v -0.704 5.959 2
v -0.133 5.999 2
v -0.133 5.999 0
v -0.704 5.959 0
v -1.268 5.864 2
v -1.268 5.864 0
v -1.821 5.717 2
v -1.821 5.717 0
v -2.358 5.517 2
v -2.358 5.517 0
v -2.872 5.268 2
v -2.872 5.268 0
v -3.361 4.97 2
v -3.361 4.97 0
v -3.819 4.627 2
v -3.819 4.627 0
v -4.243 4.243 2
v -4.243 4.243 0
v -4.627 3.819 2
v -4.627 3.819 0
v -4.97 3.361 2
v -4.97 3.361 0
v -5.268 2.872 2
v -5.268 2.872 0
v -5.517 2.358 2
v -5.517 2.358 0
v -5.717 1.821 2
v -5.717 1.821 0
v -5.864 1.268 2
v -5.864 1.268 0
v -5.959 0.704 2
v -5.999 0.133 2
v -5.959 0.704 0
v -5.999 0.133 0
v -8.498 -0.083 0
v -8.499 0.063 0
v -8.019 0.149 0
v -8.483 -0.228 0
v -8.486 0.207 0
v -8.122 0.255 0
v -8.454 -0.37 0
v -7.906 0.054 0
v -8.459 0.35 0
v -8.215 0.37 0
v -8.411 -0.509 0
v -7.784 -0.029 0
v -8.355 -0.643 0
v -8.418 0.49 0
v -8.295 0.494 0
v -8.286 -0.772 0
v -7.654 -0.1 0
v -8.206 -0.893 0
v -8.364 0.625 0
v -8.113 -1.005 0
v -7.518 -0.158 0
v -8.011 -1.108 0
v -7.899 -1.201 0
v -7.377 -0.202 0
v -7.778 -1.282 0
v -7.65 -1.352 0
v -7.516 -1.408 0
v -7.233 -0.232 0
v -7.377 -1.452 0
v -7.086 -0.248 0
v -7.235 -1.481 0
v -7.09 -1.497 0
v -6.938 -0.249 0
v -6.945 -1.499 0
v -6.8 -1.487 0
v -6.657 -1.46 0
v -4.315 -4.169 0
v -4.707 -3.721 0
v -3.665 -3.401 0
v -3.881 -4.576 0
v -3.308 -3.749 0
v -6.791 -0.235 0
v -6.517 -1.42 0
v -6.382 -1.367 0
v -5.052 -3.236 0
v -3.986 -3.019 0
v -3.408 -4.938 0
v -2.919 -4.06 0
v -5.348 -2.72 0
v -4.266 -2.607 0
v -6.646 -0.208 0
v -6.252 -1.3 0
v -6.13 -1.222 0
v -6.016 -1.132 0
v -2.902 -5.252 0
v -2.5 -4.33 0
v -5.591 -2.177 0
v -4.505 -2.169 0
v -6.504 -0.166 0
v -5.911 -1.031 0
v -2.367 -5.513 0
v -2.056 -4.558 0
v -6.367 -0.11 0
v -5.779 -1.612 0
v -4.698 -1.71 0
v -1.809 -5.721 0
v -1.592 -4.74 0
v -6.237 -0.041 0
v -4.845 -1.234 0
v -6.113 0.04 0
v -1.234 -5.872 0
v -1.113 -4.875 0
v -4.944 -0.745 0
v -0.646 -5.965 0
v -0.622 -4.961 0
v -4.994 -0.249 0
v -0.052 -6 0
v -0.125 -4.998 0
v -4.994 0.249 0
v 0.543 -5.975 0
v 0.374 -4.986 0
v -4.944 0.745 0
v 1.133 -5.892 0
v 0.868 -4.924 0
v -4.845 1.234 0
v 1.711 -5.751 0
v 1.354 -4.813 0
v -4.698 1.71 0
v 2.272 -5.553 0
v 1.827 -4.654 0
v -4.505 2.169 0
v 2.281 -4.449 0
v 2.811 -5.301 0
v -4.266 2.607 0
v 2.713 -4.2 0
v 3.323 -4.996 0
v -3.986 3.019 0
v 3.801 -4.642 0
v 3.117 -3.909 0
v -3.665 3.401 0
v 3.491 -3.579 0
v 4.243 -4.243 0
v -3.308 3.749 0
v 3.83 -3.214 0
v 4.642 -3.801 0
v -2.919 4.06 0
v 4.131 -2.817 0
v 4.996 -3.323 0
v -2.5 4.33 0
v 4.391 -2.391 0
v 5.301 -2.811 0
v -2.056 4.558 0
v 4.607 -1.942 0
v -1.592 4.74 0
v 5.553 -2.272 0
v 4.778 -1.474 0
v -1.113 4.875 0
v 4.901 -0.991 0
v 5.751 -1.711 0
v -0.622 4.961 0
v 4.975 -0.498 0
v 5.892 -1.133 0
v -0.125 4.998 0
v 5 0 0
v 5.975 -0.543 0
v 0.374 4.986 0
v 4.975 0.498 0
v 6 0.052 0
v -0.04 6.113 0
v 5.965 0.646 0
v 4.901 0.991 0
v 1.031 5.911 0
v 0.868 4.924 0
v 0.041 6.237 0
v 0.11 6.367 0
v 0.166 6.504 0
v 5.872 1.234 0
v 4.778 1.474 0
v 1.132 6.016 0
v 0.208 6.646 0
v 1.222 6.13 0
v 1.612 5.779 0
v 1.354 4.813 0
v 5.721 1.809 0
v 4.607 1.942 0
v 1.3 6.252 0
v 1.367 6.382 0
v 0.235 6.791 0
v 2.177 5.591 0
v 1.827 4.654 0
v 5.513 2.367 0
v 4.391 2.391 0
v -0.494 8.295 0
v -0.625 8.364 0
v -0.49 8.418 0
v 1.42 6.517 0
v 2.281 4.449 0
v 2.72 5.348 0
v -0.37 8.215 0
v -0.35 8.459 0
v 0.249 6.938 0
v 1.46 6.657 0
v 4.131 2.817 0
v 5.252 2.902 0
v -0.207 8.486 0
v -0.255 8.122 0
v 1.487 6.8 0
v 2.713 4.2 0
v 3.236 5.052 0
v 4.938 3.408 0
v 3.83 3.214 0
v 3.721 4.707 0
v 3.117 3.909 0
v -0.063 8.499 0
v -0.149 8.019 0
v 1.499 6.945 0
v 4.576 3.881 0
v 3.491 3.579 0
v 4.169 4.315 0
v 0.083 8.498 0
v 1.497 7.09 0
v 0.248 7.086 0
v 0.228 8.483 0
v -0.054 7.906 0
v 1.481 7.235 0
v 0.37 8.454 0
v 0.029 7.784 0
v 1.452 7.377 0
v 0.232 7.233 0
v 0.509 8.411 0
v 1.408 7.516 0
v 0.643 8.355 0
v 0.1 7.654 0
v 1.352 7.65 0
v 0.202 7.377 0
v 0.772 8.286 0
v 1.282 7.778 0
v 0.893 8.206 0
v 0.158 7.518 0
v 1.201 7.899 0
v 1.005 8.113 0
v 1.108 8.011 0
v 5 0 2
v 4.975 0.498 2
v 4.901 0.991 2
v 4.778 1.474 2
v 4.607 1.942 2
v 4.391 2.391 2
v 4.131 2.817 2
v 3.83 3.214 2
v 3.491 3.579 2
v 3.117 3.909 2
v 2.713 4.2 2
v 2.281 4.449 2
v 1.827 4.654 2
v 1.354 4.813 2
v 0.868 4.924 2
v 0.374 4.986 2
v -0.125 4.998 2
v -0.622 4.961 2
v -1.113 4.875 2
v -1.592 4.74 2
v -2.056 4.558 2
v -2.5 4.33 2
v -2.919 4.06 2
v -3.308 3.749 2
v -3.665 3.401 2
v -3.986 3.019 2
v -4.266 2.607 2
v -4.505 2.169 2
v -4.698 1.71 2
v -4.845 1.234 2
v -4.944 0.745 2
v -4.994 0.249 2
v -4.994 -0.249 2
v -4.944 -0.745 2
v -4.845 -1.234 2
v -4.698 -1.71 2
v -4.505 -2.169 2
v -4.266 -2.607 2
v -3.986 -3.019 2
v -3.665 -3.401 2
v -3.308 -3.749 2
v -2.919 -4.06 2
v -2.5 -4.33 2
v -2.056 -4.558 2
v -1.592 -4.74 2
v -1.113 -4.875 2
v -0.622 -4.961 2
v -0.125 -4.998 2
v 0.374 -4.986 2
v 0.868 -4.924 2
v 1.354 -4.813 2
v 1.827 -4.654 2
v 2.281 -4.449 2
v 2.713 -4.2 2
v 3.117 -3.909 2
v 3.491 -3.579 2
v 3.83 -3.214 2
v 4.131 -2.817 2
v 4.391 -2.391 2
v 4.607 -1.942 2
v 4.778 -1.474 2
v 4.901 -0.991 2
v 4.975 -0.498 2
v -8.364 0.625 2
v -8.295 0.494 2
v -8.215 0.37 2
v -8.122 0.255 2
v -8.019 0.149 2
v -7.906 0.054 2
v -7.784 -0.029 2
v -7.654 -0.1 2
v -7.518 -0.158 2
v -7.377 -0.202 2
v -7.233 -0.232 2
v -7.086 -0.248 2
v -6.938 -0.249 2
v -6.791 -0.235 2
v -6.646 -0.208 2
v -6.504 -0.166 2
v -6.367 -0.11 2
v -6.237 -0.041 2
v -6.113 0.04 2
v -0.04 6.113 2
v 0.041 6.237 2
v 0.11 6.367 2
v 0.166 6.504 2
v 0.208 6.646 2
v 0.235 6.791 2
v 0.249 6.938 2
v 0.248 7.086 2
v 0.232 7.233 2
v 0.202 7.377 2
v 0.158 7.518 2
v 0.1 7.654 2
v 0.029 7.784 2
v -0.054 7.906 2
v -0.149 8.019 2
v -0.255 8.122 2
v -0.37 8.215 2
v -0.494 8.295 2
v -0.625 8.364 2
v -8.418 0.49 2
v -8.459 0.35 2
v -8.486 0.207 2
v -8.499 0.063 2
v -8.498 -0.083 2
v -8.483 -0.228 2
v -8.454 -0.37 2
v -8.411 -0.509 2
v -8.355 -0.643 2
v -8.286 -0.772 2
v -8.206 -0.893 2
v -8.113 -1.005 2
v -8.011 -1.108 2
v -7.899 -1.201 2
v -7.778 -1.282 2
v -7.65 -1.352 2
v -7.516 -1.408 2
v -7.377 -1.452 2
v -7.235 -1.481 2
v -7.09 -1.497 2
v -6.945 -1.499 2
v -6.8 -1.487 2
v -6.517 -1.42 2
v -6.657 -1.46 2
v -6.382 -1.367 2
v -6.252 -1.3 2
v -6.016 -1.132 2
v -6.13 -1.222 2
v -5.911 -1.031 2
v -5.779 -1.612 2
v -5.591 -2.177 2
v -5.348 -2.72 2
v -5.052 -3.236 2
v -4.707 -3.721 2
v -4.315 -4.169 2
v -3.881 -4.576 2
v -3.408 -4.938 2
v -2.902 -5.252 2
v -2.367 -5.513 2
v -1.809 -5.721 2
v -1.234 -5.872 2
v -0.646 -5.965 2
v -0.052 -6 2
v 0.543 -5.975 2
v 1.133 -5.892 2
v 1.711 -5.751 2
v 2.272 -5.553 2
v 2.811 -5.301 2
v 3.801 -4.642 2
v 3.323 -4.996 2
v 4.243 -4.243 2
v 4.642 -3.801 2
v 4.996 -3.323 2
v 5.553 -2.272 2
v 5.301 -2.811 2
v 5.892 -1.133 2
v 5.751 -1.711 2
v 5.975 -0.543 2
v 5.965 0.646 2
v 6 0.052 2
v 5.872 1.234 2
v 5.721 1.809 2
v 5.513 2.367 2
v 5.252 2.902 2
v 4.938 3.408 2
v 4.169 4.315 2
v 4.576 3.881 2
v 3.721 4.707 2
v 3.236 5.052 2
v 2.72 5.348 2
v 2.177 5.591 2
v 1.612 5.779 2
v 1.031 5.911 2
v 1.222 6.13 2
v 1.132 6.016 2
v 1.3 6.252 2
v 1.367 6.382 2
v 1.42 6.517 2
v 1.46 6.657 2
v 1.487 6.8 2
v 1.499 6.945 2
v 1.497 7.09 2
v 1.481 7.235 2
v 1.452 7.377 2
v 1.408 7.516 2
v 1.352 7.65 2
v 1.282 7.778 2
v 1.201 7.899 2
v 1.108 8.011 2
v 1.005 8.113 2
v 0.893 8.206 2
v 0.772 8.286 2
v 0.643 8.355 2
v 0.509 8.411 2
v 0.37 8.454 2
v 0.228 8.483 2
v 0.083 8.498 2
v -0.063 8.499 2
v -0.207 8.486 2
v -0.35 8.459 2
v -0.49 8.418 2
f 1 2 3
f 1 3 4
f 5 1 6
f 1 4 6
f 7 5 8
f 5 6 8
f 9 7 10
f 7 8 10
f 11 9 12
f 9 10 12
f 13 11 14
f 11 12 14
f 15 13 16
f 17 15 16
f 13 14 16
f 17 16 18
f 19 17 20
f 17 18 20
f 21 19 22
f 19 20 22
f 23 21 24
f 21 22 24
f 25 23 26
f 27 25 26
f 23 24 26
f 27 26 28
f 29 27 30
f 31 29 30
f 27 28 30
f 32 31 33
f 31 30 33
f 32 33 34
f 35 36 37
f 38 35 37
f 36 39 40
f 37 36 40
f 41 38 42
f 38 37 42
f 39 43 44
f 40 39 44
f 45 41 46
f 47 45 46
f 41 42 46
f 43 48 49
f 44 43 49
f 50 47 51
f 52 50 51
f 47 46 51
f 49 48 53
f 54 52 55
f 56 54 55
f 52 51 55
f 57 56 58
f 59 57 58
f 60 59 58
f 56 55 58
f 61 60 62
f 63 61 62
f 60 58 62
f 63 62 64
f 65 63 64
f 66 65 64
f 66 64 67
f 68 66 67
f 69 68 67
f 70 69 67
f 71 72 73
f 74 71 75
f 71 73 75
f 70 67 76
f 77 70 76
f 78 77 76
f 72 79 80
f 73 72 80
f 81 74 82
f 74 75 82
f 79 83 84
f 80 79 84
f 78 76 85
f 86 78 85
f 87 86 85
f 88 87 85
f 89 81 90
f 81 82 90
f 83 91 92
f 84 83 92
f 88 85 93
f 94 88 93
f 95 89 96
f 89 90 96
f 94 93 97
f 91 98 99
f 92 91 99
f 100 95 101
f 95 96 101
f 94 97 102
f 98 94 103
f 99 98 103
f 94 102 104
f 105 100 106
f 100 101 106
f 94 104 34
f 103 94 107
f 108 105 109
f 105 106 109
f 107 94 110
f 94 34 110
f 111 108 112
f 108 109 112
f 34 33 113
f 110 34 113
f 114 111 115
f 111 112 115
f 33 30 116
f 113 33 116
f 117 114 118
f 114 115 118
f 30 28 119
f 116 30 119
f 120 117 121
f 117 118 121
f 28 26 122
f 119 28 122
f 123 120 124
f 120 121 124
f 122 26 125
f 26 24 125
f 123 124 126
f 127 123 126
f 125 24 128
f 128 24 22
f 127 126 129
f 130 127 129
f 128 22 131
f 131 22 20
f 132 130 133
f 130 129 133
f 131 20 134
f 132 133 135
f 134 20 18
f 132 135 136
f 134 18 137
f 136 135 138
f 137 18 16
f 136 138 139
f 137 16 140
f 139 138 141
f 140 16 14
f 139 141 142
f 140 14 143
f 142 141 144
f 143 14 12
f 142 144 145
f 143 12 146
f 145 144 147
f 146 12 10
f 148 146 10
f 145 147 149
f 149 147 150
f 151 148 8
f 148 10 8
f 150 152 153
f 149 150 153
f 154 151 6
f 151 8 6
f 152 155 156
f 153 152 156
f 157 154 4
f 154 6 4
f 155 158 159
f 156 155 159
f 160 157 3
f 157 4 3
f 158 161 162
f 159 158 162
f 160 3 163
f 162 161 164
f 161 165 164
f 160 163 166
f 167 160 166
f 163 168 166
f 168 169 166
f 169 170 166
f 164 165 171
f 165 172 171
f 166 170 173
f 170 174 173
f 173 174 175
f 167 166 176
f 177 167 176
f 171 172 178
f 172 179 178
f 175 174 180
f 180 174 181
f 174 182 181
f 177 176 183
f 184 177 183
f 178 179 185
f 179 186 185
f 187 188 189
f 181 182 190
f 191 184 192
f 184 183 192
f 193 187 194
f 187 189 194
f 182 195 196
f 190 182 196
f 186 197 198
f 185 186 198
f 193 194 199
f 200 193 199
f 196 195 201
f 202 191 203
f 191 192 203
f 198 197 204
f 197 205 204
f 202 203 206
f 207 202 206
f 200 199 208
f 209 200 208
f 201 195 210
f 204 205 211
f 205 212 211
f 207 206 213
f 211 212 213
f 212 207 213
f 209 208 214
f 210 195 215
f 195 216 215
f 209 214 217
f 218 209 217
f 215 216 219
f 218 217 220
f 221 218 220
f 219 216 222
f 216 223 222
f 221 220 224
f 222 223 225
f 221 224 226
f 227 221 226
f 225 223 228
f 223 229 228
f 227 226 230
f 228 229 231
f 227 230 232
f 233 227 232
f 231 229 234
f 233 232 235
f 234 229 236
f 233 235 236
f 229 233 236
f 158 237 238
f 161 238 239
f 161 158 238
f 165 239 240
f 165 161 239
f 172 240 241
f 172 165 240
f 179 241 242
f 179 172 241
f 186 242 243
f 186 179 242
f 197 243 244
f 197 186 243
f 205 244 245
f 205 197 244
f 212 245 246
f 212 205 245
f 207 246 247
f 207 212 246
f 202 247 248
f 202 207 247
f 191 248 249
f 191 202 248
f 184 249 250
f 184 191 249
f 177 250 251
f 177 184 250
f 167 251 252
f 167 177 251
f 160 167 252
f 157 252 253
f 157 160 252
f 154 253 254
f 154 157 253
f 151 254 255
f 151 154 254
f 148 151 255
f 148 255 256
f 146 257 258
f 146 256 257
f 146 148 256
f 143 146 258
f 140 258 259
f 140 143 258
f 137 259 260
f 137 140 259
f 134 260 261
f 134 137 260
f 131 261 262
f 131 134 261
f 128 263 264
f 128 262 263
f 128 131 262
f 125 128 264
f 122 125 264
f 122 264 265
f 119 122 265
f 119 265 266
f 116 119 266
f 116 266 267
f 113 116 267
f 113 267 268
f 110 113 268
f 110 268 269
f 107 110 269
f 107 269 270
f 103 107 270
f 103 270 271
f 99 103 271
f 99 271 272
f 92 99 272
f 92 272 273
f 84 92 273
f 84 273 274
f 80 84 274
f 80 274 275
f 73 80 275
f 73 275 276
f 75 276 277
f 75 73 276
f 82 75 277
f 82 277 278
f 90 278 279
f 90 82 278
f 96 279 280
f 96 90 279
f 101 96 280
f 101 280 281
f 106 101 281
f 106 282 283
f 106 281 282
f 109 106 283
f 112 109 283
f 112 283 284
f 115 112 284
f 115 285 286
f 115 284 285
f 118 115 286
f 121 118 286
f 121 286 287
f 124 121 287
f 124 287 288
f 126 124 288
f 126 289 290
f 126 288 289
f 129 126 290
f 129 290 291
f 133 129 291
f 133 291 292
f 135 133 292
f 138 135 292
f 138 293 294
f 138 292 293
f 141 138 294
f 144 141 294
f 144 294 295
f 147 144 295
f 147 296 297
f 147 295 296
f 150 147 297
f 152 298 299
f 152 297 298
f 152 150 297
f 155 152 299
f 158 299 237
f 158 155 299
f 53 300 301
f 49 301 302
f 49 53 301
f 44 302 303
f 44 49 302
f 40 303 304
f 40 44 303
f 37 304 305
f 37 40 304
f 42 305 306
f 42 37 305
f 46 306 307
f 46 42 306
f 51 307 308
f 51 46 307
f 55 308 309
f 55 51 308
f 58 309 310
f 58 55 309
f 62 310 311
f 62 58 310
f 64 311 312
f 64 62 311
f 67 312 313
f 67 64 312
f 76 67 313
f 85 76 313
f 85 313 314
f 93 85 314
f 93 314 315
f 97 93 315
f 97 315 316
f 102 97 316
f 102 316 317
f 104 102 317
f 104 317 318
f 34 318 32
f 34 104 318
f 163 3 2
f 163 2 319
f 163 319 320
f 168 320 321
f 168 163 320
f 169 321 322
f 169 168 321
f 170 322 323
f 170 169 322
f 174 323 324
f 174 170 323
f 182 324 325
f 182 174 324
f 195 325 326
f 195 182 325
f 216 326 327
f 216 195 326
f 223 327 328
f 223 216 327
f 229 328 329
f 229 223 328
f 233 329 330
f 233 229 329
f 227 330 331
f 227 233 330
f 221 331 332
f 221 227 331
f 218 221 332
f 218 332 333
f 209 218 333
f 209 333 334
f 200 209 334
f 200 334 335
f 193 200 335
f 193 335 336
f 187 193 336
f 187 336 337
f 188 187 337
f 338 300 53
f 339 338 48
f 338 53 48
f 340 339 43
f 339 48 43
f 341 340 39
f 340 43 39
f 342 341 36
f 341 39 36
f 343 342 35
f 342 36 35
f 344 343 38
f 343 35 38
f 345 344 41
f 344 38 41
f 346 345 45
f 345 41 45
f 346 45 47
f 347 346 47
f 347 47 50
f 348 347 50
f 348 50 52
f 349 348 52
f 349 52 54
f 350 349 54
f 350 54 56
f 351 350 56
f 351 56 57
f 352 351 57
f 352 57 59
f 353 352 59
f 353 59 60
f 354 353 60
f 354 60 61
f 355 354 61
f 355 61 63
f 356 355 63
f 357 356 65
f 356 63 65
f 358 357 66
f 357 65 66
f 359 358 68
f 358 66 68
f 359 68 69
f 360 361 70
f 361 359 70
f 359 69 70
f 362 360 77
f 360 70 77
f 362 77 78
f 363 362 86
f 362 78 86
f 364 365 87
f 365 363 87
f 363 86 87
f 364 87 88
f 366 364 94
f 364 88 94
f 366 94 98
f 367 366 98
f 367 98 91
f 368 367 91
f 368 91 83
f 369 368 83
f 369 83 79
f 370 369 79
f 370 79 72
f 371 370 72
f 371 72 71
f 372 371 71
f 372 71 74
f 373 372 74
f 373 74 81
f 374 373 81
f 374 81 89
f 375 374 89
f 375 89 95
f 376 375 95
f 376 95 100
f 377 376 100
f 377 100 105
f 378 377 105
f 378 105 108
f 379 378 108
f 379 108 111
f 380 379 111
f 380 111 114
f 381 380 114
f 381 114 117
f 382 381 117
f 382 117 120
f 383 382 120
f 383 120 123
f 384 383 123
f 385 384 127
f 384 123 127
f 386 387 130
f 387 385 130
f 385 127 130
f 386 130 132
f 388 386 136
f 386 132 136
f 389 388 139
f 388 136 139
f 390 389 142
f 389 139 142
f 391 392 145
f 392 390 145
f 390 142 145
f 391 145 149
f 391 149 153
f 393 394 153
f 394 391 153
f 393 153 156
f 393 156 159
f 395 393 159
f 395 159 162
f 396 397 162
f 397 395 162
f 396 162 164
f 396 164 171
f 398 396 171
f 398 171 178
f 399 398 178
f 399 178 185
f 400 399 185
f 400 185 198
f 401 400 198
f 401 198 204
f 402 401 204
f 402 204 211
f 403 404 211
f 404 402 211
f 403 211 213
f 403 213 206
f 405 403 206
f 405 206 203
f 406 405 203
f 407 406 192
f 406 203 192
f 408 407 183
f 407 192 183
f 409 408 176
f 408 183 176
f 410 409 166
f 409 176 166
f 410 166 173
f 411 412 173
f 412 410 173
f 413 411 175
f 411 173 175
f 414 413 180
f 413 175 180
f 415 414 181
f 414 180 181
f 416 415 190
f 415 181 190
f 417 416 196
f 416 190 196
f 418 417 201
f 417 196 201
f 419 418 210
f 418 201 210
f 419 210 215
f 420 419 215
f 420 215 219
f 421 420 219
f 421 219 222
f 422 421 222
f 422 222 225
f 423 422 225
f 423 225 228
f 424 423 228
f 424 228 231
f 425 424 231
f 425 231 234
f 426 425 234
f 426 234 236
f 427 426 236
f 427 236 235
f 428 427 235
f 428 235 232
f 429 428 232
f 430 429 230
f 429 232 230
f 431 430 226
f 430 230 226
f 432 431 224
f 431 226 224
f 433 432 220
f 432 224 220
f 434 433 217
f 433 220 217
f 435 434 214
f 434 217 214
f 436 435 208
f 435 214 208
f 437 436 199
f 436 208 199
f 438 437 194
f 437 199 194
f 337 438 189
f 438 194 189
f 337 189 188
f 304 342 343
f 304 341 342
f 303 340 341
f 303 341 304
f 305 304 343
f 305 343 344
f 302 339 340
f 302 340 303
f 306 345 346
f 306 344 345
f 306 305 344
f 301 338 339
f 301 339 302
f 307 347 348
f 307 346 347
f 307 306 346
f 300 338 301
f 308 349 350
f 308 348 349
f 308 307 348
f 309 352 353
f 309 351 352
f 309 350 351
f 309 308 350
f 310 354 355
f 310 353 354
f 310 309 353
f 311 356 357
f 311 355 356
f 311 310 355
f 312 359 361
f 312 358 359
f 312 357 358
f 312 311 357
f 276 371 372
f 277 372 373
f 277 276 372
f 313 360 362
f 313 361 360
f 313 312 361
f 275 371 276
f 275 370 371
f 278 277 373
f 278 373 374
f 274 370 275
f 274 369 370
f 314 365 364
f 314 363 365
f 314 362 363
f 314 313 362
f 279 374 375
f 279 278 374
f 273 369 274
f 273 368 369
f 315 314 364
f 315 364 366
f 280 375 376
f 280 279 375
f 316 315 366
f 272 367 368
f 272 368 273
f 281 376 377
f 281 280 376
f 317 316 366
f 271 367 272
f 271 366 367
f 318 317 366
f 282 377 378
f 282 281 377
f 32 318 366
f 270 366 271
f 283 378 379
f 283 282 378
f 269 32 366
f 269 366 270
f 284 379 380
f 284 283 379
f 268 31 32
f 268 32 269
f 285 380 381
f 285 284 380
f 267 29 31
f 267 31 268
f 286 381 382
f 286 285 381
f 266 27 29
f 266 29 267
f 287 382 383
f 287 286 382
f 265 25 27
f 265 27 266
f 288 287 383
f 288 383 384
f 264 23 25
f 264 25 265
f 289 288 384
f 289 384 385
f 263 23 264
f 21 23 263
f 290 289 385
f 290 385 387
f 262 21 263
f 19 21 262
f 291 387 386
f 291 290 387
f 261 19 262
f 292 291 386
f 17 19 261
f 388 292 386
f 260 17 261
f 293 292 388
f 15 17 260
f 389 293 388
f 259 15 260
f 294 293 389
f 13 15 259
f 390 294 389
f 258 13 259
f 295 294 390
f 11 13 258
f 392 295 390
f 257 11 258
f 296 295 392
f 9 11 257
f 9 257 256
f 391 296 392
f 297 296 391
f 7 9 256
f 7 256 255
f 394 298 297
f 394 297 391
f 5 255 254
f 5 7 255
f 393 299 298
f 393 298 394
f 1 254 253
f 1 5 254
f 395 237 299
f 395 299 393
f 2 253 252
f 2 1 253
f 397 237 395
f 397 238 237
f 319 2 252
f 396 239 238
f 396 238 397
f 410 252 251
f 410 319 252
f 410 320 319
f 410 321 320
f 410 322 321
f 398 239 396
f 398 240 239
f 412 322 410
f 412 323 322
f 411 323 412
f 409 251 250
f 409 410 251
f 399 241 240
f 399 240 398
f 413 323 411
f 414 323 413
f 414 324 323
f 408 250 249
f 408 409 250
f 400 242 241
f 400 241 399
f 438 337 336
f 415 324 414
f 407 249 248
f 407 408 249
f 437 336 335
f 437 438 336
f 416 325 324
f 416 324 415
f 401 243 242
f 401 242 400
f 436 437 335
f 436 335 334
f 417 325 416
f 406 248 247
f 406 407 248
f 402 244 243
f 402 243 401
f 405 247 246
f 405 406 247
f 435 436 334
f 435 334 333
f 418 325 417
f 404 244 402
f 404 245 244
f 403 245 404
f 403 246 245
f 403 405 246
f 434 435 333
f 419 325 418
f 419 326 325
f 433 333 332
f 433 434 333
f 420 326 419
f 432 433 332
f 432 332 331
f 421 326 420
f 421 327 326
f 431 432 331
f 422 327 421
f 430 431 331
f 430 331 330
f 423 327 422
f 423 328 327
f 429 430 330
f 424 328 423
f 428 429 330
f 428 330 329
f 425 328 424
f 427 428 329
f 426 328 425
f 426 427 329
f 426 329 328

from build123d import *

# Parameters (mm, degrees)
CYLINDER001_R     = 5
CYLINDER001_DEPTH = 3
CYLINDER_R        = 6
CYLINDER_DEPTH    = 2
CYLINDER005_R     = 1.5
CYLINDER005_DEPTH = 10
CYLINDER004_R     = 1.5
CYLINDER004_DEPTH = 10
CYLINDER003_R     = 1.5
CYLINDER003_DEPTH = 2
CYLINDER002_R     = 1.5
CYLINDER002_DEPTH = 2


with BuildPart() as cylinder001:
    # Cylinder001 → Cylinder001 (new body)
    with BuildSketch(Plane.XY):
        Circle(CYLINDER001_R)
    extrude(amount=CYLINDER001_DEPTH)


with BuildPart() as cut:
    # Cylinder → Cylinder (new body)
    with BuildSketch(Plane.XY):
        Circle(CYLINDER_R)
    extrude(amount=CYLINDER_DEPTH)

    # Cut: cut Cylinder001
    add(cylinder001.part, mode=Mode.SUBTRACT)


with BuildPart() as cylinder005:
    # Cylinder005 → Cylinder005 (new body)
    with BuildSketch(Plane(origin=(-1.25, 7, 0), x_dir=(1, 0, 0), z_dir=(0, 0, 1))):
        Circle(CYLINDER005_R)
    extrude(amount=CYLINDER005_DEPTH)


with BuildPart() as fusion:
    # Cylinder004 → Cylinder004 (new body)
    with BuildSketch(Plane(origin=(-7, 1.25, 0), x_dir=(1, 0, 0), z_dir=(0, 0, 1))):
        Circle(CYLINDER004_R)
    extrude(amount=CYLINDER004_DEPTH)

    # Fusion: union Cylinder005
    add(cylinder005.part)


with BuildPart() as cylinder003:
    # Cylinder003 → Cylinder003 (new body)
    with BuildSketch(Plane(origin=(0, 7, 0), x_dir=(1, 0, 0), z_dir=(0, 0, 1))):
        Circle(CYLINDER003_R)
    extrude(amount=CYLINDER003_DEPTH)


with BuildPart() as fusion002:
    # Cylinder002 → Cylinder002 (new body)
    with BuildSketch(Plane(origin=(-7, 0, 0), x_dir=(1, 0, 0), z_dir=(0, 0, 1))):
        Circle(CYLINDER002_R)
    extrude(amount=CYLINDER002_DEPTH)

    # Fusion001: union Cylinder003
    add(cylinder003.part)

    # Cut001: cut Fusion
    add(fusion.part, mode=Mode.SUBTRACT)

    # Fusion002: union Cut
    add(cut.part)


solid = fusion002.part
